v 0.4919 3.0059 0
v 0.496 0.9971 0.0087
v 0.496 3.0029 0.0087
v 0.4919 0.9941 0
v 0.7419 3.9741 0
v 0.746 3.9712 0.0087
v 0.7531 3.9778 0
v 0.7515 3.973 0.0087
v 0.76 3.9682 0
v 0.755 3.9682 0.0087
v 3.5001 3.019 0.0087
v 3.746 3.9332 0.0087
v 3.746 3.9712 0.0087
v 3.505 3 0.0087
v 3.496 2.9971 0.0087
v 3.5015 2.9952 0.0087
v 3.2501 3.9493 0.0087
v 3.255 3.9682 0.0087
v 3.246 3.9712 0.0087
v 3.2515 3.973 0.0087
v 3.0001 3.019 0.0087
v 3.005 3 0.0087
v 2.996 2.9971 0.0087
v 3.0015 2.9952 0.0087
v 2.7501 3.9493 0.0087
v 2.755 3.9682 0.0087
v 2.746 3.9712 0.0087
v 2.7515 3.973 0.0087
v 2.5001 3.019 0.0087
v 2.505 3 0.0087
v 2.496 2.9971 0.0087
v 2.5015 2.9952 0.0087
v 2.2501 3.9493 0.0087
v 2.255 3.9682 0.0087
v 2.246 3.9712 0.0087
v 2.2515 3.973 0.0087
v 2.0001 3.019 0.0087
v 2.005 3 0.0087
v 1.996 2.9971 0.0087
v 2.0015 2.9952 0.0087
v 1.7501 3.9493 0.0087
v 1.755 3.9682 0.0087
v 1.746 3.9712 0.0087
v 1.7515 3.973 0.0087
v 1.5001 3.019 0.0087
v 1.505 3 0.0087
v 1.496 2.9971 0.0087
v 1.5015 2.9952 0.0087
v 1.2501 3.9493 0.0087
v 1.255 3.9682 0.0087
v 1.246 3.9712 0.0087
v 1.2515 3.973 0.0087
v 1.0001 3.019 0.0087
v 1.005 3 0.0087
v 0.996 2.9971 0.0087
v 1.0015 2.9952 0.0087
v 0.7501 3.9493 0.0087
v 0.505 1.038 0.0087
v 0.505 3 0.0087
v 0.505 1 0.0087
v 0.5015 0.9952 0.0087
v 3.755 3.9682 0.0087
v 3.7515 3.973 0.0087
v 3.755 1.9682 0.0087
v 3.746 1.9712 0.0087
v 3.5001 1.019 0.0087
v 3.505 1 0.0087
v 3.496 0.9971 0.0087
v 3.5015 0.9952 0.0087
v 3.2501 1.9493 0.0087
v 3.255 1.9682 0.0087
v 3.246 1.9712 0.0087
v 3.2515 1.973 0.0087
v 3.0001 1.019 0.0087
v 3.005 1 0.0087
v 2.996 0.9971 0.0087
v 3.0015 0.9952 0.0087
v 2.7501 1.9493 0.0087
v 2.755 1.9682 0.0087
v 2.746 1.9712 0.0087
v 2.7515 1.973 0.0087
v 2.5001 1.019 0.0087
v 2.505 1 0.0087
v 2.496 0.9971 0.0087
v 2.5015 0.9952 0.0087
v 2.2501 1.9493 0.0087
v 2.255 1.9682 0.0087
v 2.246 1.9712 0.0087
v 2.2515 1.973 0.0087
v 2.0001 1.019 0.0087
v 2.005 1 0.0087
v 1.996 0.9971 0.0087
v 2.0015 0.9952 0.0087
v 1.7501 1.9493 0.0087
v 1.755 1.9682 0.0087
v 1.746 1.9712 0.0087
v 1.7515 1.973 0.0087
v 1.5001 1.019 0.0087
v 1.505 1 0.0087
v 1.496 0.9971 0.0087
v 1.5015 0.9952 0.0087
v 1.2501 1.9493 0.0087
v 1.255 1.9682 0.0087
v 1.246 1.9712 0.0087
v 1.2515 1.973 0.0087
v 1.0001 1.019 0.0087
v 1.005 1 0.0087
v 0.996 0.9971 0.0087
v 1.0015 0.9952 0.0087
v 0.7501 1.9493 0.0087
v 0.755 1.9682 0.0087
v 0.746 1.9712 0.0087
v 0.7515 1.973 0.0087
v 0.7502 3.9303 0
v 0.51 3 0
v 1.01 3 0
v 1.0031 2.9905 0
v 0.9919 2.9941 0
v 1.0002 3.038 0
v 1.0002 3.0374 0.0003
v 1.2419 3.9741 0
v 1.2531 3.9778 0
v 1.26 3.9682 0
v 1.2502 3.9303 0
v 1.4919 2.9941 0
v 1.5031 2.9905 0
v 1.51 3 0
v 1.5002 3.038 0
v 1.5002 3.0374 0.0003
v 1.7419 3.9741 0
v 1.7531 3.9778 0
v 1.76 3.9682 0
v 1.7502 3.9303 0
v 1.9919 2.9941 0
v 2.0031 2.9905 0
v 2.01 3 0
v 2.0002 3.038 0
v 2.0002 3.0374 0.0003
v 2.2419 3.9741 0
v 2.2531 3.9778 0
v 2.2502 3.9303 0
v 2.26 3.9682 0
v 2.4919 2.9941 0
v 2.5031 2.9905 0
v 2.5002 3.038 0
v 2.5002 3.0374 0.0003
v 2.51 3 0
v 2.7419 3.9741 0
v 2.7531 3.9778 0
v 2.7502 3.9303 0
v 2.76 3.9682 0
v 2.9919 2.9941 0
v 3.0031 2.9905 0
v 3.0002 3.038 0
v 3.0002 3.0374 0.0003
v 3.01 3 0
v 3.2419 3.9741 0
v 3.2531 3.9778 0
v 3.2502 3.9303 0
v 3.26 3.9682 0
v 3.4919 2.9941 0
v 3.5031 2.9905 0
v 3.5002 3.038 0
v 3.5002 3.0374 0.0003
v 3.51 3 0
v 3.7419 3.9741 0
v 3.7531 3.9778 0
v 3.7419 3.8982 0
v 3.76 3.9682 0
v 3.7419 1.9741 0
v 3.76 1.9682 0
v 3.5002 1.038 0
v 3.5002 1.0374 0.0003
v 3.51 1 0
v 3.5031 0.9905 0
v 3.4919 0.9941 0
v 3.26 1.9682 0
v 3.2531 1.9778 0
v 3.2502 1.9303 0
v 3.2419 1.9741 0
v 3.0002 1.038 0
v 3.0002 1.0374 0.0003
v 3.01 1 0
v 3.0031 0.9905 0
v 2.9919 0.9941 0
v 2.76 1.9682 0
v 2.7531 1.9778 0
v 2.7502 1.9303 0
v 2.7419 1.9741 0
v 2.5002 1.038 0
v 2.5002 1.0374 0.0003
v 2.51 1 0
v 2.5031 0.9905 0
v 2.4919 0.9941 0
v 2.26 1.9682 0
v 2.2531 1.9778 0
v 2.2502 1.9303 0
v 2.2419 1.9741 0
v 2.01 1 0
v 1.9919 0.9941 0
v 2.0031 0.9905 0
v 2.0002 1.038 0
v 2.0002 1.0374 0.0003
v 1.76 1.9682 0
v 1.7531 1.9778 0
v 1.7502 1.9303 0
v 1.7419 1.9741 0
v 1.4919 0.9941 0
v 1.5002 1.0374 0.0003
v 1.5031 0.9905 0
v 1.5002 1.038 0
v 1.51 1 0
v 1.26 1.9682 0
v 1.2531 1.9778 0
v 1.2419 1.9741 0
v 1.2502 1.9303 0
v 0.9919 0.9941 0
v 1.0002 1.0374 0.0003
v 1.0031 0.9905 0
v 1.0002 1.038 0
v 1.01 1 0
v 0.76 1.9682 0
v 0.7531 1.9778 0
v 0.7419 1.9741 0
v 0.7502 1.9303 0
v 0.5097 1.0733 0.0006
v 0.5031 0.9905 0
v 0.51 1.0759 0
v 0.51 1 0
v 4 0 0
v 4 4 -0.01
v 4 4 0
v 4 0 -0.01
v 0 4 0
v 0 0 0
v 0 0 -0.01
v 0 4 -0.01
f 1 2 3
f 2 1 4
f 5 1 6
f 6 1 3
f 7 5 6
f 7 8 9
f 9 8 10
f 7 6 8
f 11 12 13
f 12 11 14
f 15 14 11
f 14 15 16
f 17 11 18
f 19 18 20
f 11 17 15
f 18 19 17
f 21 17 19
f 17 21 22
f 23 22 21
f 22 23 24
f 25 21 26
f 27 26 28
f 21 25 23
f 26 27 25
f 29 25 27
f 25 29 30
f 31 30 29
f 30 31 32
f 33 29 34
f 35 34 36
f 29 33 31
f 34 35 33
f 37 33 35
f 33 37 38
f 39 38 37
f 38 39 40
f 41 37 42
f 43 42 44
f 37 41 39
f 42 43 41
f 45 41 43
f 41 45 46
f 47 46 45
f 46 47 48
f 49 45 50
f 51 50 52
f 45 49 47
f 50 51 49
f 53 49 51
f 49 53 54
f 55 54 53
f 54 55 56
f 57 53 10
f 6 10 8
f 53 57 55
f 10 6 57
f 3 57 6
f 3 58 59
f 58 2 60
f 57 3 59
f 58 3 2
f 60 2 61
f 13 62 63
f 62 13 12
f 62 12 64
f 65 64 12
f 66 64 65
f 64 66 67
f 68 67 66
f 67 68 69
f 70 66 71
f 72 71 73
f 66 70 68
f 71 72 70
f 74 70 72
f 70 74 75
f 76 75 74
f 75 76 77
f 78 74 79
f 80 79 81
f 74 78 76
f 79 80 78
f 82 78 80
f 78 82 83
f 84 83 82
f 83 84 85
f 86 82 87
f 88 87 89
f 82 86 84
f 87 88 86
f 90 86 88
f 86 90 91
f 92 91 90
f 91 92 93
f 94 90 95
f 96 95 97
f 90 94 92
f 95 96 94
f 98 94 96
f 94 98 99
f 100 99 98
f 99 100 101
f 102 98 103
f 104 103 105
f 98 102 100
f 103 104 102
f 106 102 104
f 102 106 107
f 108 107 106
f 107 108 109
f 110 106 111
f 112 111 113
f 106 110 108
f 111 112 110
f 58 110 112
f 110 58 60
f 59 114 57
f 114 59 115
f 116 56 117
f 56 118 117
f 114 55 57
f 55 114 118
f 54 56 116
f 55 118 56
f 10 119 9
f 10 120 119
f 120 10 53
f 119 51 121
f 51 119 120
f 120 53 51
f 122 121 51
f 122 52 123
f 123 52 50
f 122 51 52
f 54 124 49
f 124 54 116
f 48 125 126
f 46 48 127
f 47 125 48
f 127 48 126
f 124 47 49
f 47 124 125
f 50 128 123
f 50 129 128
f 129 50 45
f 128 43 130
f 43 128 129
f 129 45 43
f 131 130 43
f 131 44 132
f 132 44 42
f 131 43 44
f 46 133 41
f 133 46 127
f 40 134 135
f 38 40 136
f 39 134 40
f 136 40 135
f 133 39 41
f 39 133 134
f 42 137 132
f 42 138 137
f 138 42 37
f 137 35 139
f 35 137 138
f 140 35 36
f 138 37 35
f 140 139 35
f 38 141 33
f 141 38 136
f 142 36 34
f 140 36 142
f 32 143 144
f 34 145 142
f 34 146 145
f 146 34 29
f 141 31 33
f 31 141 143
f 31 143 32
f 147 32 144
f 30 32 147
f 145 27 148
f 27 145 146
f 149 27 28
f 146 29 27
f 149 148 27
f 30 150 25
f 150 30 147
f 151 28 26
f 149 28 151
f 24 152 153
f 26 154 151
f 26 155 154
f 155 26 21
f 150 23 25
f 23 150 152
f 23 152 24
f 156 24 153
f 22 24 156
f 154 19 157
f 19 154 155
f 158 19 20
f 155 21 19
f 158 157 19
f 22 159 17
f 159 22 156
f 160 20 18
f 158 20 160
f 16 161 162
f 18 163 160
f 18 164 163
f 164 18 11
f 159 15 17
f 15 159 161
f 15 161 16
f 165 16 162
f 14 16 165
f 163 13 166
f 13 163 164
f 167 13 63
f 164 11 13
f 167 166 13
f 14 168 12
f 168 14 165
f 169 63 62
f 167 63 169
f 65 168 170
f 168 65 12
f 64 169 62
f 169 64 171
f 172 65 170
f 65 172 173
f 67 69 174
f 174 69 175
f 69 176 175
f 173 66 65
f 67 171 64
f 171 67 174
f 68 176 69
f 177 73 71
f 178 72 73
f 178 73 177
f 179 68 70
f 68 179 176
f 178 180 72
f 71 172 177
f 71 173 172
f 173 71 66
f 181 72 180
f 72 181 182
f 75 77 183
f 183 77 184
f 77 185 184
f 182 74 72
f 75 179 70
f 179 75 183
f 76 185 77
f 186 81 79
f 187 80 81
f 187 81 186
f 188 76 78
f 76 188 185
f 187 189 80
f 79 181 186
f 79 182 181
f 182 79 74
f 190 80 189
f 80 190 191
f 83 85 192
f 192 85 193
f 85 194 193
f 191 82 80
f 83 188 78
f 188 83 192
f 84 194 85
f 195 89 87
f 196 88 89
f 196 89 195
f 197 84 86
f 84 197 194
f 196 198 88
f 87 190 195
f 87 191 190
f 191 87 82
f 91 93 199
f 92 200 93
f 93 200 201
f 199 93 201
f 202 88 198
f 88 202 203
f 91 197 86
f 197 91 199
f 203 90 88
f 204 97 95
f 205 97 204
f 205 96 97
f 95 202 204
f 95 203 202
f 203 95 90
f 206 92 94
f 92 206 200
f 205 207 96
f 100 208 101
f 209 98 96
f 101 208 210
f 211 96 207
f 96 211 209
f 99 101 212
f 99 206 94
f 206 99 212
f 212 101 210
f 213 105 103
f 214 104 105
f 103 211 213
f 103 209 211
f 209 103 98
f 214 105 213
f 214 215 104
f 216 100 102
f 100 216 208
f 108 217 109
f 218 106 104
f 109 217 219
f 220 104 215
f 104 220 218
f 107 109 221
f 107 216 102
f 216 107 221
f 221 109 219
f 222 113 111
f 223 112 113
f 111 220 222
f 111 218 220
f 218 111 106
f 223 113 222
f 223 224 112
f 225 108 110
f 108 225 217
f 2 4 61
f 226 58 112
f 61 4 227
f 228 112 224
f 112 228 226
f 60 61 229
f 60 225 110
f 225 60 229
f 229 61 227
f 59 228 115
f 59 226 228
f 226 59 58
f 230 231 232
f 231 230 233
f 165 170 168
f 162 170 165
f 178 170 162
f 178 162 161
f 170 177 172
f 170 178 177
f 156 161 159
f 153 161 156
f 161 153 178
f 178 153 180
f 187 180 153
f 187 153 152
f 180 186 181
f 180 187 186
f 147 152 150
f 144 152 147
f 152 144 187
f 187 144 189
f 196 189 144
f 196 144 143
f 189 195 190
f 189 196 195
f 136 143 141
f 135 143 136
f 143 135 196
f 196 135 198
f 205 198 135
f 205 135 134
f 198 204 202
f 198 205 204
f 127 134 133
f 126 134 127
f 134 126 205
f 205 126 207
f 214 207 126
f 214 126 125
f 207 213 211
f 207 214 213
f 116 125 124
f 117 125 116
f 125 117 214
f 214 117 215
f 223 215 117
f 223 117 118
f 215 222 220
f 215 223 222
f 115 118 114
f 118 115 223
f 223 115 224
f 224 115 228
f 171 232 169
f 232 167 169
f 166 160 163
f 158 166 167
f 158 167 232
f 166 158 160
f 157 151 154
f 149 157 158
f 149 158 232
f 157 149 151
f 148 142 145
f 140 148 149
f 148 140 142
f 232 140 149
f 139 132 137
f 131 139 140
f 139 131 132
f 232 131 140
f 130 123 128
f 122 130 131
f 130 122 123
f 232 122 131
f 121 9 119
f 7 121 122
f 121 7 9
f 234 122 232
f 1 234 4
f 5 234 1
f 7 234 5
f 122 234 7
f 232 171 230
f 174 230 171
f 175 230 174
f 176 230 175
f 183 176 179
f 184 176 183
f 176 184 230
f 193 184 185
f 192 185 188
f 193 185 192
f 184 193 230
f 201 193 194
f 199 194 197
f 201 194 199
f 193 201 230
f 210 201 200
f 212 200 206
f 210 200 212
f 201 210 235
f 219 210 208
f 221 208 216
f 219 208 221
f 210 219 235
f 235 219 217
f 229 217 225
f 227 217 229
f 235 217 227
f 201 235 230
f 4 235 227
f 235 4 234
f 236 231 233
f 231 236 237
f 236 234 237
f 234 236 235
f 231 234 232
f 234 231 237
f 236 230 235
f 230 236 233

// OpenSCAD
hull(){
    translate([0.5, 3.0]) sphere(0.01);
    translate([0.75, 3.9682458365518545]) sphere(0.01);
}
hull(){
    translate([0.75, 3.9682458365518545]) sphere(0.01);
    translate([1.0, 3.0]) sphere(0.01);
}
hull(){
    translate([1.0, 3.0]) sphere(0.01);
    translate([1.25, 3.9682458365518545]) sphere(0.01);
}
hull(){
    translate([1.25, 3.9682458365518545]) sphere(0.01);
    translate([1.5, 3.0]) sphere(0.01);
}
hull(){
    translate([1.5, 3.0]) sphere(0.01);
    translate([1.75, 3.9682458365518545]) sphere(0.01);
}
hull(){
    translate([1.75, 3.9682458365518545]) sphere(0.01);
    translate([2.0, 3.0]) sphere(0.01);
}
hull(){
    translate([2.0, 3.0]) sphere(0.01);
    translate([2.25, 3.9682458365518545]) sphere(0.01);
}
hull(){
    translate([2.25, 3.9682458365518545]) sphere(0.01);
    translate([2.5, 3.0]) sphere(0.01);
}
hull(){
    translate([2.5, 3.0]) sphere(0.01);
    translate([2.75, 3.9682458365518545]) sphere(0.01);
}
hull(){
    translate([2.75, 3.9682458365518545]) sphere(0.01);
    translate([3.0, 3.0]) sphere(0.01);
}
hull(){
    translate([3.0, 3.0]) sphere(0.01);
    translate([3.25, 3.9682458365518545]) sphere(0.01);
}
hull(){
    translate([3.25, 3.9682458365518545]) sphere(0.01);
    translate([3.5, 3.0]) sphere(0.01);
}
hull(){
    translate([3.5, 3.0]) sphere(0.01);
    translate([3.75, 3.9682458365518545]) sphere(0.01);
}
hull(){
    translate([3.75, 3.9682458365518545]) sphere(0.01);
    translate([3.75, 2.9682458365518545]) sphere(0.01);
}
hull(){
    translate([3.75, 2.9682458365518545]) sphere(0.01);
    translate([3.75, 1.9682458365518543]) sphere(0.01);
}
hull(){
    translate([3.75, 1.9682458365518543]) sphere(0.01);
    translate([3.5, 1.0]) sphere(0.01);
}
hull(){
    translate([3.5, 1.0]) sphere(0.01);
    translate([3.25, 1.9682458365518543]) sphere(0.01);
}
hull(){
    translate([3.25, 1.9682458365518543]) sphere(0.01);
    translate([3.0, 1.0]) sphere(0.01);
}
hull(){
    translate([3.0, 1.0]) sphere(0.01);
    translate([2.75, 1.9682458365518543]) sphere(0.01);
}
hull(){
    translate([2.75, 1.9682458365518543]) sphere(0.01);
    translate([2.5, 1.0]) sphere(0.01);
}
hull(){
    translate([2.5, 1.0]) sphere(0.01);
    translate([2.25, 1.9682458365518543]) sphere(0.01);
}
hull(){
    translate([2.25, 1.9682458365518543]) sphere(0.01);
    translate([2.0, 1.0]) sphere(0.01);
}
hull(){
    translate([2.0, 1.0]) sphere(0.01);
    translate([1.75, 1.9682458365518543]) sphere(0.01);
}
hull(){
    translate([1.75, 1.9682458365518543]) sphere(0.01);
    translate([1.5, 1.0]) sphere(0.01);
}
hull(){
    translate([1.5, 1.0]) sphere(0.01);
    translate([1.25, 1.9682458365518543]) sphere(0.01);
}
hull(){
    translate([1.25, 1.9682458365518543]) sphere(0.01);
    translate([1.0, 1.0]) sphere(0.01);
}
hull(){
    translate([1.0, 1.0]) sphere(0.01);
    translate([0.75, 1.9682458365518543]) sphere(0.01);
}
hull(){
    translate([0.75, 1.9682458365518543]) sphere(0.01);
    translate([0.5, 1.0]) sphere(0.01);
}
hull(){
    translate([0.5, 1.0]) sphere(0.01);
    translate([0.5, 2.0]) sphere(0.01);
}
hull(){
    translate([0.5, 2.0]) sphere(0.01);
    translate([0.5, 3.0]) sphere(0.01);
}
translate([0,0,-0.01]) color([0.1,0.1,0.1]) cube([4,4,0.01]);
